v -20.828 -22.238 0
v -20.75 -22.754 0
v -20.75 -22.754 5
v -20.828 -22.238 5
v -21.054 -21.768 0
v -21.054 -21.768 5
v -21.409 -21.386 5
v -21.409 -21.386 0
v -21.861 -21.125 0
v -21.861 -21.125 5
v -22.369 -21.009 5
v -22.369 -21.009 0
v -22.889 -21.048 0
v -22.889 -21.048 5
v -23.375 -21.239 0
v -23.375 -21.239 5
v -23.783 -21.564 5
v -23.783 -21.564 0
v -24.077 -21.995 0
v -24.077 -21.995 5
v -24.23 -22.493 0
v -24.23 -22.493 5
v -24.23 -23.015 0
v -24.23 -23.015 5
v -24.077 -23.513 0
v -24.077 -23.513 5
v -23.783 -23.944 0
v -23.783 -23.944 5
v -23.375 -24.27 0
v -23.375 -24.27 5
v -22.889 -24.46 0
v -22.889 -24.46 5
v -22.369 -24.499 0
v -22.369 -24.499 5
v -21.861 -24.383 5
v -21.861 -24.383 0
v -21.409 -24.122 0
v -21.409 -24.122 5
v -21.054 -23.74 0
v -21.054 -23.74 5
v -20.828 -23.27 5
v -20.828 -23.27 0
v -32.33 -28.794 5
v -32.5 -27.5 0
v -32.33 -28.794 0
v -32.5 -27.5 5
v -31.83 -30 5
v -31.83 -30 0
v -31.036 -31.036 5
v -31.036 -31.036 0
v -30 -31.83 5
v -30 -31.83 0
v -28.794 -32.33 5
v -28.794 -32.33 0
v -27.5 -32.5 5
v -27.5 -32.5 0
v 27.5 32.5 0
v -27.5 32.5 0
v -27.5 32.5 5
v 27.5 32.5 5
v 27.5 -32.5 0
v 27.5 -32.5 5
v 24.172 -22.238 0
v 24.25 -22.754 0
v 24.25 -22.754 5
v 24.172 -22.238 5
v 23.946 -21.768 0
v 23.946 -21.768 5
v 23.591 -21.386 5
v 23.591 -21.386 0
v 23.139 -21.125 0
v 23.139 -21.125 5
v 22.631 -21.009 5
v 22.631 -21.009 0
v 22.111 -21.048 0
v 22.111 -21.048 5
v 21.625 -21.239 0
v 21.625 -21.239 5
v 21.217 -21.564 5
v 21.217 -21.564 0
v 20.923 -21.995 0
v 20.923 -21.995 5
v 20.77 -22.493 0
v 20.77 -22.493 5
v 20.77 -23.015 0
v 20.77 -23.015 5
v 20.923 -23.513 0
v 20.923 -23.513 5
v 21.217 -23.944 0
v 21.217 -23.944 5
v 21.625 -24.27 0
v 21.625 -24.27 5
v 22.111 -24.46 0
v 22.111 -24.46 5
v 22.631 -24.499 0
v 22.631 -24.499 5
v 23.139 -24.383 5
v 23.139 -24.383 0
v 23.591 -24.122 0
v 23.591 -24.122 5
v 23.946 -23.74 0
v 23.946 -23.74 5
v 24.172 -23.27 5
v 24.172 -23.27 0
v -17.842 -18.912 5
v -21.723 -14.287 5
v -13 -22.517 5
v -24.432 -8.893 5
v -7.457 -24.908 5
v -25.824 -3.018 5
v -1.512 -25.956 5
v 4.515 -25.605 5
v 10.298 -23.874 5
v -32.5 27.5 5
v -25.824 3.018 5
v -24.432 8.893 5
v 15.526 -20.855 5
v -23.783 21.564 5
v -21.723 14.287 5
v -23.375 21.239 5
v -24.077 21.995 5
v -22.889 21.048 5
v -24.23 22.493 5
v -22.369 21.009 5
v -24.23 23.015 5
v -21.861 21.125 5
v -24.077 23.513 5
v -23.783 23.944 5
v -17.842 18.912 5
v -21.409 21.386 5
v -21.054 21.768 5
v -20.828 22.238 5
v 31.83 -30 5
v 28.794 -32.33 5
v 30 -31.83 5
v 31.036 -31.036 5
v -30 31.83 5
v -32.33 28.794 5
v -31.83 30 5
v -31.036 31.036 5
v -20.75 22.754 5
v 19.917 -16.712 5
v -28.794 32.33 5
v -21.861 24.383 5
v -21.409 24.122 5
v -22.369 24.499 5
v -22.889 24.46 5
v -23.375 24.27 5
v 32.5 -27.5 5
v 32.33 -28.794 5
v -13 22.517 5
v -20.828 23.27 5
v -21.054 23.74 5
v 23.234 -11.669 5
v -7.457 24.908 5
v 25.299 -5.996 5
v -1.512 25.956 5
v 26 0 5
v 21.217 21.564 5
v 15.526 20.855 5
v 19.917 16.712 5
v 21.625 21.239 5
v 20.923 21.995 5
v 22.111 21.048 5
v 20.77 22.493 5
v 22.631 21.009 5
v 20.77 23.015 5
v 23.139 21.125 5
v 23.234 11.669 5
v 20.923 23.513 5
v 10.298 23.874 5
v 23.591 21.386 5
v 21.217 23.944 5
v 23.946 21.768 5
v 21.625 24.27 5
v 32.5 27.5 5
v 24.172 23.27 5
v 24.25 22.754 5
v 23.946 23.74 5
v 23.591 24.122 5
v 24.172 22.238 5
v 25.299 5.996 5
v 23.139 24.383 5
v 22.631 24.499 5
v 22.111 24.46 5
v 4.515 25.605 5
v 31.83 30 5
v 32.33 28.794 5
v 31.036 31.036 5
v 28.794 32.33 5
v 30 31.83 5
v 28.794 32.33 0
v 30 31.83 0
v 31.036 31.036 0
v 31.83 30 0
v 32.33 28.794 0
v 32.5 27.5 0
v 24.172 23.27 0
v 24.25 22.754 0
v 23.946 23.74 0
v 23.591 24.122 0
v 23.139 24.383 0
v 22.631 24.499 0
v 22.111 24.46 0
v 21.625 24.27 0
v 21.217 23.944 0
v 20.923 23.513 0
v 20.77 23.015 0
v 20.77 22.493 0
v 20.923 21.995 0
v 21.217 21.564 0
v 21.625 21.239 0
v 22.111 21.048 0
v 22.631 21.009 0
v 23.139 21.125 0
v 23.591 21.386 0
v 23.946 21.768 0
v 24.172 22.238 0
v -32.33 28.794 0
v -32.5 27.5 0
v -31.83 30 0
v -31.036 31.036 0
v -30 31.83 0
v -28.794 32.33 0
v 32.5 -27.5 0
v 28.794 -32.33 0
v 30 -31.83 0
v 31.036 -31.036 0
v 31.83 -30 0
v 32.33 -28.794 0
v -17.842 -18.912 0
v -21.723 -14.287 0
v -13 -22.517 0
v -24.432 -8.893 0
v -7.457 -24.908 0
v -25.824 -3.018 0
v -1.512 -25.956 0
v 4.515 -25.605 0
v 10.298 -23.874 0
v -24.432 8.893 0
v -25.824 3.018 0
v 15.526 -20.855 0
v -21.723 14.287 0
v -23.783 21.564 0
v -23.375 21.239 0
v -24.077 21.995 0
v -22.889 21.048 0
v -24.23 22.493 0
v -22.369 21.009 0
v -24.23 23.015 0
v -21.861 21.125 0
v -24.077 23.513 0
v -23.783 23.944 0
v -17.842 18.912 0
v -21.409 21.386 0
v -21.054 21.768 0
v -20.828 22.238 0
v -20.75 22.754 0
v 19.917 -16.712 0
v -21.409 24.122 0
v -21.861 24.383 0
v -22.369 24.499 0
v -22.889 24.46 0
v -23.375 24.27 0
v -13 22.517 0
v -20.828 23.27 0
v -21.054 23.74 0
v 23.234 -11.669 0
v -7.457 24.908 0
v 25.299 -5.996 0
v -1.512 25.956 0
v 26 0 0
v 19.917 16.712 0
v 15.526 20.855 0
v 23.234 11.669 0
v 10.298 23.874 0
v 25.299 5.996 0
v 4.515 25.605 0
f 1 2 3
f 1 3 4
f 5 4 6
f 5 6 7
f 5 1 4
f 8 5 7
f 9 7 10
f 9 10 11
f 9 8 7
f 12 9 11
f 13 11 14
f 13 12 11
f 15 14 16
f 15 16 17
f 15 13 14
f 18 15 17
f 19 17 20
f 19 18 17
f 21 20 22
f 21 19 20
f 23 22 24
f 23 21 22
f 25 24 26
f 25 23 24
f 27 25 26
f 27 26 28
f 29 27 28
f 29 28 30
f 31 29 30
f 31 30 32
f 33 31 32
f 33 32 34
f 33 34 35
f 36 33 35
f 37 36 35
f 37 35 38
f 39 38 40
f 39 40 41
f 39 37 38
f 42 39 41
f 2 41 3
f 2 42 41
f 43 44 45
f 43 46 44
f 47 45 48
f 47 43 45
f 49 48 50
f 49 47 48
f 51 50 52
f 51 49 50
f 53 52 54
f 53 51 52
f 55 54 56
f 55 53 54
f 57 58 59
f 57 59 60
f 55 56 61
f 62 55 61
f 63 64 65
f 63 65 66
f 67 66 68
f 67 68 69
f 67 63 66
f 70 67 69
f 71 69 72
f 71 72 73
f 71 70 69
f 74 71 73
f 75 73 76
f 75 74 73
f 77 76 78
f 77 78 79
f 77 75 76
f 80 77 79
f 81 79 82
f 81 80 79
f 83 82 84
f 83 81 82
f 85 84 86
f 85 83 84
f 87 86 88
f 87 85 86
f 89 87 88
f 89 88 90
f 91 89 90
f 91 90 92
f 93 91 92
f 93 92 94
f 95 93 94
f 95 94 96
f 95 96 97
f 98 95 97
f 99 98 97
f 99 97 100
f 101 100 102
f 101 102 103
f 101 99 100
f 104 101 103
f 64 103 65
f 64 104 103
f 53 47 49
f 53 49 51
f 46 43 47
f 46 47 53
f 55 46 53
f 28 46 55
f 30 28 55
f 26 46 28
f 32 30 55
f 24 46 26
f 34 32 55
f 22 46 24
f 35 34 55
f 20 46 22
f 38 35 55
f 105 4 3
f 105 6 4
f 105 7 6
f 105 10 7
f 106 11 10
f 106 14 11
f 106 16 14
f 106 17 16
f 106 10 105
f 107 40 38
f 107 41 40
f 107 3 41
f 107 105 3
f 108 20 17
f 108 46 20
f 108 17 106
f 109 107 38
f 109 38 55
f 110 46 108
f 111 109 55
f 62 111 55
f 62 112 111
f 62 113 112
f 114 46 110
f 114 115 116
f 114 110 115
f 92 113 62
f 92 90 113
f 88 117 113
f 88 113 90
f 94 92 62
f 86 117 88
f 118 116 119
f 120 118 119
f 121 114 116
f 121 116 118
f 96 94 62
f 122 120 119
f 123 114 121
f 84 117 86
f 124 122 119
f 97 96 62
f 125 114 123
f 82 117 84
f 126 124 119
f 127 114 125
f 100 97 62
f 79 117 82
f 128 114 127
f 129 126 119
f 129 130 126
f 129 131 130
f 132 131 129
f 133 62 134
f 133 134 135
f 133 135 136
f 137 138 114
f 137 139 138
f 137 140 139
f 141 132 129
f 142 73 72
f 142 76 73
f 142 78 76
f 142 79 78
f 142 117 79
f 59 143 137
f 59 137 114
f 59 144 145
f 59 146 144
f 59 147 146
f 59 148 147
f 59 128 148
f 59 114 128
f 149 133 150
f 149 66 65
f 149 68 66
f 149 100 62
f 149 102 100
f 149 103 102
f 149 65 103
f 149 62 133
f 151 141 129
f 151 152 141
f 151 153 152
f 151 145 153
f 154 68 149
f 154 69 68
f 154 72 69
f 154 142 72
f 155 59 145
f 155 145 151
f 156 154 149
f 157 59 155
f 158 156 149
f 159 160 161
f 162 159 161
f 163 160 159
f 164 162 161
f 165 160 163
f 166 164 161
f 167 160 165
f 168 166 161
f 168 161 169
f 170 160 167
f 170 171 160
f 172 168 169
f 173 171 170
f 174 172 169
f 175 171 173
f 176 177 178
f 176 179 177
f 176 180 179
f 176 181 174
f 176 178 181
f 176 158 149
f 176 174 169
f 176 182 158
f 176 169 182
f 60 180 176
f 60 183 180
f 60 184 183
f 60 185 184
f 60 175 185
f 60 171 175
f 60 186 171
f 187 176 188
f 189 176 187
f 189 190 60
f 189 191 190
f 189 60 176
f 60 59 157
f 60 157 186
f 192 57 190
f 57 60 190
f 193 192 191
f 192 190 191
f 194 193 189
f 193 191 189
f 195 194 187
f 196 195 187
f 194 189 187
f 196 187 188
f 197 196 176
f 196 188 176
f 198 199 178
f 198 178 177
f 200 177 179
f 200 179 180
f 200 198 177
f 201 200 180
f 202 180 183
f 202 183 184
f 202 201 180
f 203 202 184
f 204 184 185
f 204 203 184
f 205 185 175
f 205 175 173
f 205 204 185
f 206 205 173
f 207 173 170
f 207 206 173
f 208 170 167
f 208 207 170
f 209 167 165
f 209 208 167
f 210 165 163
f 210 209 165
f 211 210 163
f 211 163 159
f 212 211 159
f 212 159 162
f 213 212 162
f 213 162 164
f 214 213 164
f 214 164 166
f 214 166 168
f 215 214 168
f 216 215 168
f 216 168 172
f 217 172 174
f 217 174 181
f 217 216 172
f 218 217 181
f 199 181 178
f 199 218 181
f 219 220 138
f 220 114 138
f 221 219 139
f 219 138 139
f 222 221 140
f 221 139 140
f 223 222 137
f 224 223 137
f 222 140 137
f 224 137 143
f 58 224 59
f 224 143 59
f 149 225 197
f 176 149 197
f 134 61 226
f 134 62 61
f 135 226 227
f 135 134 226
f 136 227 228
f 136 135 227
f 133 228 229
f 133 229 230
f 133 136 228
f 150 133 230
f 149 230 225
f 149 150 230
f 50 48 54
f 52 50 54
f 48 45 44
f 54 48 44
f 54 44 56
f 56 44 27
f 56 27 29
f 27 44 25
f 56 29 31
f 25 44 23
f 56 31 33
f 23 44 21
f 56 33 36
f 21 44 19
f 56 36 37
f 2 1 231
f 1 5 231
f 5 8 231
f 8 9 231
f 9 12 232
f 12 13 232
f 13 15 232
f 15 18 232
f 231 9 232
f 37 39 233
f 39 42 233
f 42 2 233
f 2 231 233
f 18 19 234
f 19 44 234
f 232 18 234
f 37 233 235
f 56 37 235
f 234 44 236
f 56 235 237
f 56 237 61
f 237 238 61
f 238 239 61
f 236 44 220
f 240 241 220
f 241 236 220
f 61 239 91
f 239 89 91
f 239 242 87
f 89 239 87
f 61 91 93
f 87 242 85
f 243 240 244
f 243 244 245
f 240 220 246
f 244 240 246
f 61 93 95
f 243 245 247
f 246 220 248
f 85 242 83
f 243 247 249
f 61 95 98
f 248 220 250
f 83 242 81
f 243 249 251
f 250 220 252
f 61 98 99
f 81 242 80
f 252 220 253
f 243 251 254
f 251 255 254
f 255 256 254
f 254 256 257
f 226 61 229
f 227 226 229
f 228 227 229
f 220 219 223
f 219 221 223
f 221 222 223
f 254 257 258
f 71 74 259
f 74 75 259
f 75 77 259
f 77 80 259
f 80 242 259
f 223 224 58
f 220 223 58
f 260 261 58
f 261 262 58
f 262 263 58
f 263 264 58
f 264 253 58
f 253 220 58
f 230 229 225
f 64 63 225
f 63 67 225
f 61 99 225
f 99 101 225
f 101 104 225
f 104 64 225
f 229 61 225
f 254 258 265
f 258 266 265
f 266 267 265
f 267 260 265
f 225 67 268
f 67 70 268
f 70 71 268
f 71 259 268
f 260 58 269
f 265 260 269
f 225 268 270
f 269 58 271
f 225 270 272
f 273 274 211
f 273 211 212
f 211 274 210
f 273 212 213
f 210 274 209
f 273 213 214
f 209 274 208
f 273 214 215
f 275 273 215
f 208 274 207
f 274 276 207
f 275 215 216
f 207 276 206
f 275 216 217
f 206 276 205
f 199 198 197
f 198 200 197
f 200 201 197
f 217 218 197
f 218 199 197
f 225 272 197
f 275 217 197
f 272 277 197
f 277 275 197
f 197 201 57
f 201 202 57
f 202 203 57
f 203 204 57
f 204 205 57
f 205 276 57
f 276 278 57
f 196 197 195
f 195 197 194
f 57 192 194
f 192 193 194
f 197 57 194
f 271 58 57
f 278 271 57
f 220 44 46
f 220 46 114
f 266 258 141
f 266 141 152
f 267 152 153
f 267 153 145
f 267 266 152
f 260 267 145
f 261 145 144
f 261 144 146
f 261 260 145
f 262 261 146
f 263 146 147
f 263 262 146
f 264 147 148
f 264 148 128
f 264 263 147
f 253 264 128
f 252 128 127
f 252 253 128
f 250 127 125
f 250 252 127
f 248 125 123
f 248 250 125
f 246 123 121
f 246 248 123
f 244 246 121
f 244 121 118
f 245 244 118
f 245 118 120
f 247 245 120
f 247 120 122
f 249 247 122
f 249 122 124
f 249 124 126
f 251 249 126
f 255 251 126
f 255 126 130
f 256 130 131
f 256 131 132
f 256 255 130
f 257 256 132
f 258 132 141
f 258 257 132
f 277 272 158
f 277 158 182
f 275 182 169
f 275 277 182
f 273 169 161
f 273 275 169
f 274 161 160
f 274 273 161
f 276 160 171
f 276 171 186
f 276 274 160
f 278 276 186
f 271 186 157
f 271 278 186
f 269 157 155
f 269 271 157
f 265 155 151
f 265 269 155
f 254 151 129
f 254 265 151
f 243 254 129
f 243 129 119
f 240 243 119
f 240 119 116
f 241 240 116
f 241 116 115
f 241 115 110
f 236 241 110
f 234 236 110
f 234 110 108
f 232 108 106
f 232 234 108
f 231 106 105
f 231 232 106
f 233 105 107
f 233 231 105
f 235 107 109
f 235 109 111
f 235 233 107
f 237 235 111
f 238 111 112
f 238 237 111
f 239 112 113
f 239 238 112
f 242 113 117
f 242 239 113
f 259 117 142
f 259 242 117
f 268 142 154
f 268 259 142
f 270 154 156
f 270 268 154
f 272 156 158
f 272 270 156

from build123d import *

# Parameters (mm, degrees)
SKETCH_W      = 65
SKETCH_H      = 65
PAD_DEPTH     = 5
SKETCH001_R   = 1.75
SKETCH001_R_2 = 26
POCKET_DEPTH  = 5
FILLET_R      = 5


with BuildPart() as part:
    # Sketch → Pad (new body)
    with BuildSketch(Plane.XY):
        Rectangle(SKETCH_W, SKETCH_H)
    extrude(amount=PAD_DEPTH)

    # Sketch001 → Pocket (cut)
    with BuildSketch(Plane.XY):
        with Locations((-22.5, 22.754121)):
            Circle(SKETCH001_R)
        with Locations((22.5, 22.754121)):
            Circle(SKETCH001_R)
        with Locations((-22.5, -22.754121)):
            Circle(SKETCH001_R)
        with Locations((22.5, -22.754121)):
            Circle(SKETCH001_R)
        Circle(SKETCH001_R_2)
    extrude(amount=POCKET_DEPTH, mode=Mode.SUBTRACT)

    # Fillet
    fillet_edges = [part.edges().sort_by_distance(p)[0] for p in [
        (-32.5, -32.5, 2.5),
        (32.5, -32.5, 2.5),
        (32.5, 32.5, 2.5),
        (-32.5, 32.5, 2.5),
    ]]
    fillet(fillet_edges, radius=FILLET_R)


solid = part.part
